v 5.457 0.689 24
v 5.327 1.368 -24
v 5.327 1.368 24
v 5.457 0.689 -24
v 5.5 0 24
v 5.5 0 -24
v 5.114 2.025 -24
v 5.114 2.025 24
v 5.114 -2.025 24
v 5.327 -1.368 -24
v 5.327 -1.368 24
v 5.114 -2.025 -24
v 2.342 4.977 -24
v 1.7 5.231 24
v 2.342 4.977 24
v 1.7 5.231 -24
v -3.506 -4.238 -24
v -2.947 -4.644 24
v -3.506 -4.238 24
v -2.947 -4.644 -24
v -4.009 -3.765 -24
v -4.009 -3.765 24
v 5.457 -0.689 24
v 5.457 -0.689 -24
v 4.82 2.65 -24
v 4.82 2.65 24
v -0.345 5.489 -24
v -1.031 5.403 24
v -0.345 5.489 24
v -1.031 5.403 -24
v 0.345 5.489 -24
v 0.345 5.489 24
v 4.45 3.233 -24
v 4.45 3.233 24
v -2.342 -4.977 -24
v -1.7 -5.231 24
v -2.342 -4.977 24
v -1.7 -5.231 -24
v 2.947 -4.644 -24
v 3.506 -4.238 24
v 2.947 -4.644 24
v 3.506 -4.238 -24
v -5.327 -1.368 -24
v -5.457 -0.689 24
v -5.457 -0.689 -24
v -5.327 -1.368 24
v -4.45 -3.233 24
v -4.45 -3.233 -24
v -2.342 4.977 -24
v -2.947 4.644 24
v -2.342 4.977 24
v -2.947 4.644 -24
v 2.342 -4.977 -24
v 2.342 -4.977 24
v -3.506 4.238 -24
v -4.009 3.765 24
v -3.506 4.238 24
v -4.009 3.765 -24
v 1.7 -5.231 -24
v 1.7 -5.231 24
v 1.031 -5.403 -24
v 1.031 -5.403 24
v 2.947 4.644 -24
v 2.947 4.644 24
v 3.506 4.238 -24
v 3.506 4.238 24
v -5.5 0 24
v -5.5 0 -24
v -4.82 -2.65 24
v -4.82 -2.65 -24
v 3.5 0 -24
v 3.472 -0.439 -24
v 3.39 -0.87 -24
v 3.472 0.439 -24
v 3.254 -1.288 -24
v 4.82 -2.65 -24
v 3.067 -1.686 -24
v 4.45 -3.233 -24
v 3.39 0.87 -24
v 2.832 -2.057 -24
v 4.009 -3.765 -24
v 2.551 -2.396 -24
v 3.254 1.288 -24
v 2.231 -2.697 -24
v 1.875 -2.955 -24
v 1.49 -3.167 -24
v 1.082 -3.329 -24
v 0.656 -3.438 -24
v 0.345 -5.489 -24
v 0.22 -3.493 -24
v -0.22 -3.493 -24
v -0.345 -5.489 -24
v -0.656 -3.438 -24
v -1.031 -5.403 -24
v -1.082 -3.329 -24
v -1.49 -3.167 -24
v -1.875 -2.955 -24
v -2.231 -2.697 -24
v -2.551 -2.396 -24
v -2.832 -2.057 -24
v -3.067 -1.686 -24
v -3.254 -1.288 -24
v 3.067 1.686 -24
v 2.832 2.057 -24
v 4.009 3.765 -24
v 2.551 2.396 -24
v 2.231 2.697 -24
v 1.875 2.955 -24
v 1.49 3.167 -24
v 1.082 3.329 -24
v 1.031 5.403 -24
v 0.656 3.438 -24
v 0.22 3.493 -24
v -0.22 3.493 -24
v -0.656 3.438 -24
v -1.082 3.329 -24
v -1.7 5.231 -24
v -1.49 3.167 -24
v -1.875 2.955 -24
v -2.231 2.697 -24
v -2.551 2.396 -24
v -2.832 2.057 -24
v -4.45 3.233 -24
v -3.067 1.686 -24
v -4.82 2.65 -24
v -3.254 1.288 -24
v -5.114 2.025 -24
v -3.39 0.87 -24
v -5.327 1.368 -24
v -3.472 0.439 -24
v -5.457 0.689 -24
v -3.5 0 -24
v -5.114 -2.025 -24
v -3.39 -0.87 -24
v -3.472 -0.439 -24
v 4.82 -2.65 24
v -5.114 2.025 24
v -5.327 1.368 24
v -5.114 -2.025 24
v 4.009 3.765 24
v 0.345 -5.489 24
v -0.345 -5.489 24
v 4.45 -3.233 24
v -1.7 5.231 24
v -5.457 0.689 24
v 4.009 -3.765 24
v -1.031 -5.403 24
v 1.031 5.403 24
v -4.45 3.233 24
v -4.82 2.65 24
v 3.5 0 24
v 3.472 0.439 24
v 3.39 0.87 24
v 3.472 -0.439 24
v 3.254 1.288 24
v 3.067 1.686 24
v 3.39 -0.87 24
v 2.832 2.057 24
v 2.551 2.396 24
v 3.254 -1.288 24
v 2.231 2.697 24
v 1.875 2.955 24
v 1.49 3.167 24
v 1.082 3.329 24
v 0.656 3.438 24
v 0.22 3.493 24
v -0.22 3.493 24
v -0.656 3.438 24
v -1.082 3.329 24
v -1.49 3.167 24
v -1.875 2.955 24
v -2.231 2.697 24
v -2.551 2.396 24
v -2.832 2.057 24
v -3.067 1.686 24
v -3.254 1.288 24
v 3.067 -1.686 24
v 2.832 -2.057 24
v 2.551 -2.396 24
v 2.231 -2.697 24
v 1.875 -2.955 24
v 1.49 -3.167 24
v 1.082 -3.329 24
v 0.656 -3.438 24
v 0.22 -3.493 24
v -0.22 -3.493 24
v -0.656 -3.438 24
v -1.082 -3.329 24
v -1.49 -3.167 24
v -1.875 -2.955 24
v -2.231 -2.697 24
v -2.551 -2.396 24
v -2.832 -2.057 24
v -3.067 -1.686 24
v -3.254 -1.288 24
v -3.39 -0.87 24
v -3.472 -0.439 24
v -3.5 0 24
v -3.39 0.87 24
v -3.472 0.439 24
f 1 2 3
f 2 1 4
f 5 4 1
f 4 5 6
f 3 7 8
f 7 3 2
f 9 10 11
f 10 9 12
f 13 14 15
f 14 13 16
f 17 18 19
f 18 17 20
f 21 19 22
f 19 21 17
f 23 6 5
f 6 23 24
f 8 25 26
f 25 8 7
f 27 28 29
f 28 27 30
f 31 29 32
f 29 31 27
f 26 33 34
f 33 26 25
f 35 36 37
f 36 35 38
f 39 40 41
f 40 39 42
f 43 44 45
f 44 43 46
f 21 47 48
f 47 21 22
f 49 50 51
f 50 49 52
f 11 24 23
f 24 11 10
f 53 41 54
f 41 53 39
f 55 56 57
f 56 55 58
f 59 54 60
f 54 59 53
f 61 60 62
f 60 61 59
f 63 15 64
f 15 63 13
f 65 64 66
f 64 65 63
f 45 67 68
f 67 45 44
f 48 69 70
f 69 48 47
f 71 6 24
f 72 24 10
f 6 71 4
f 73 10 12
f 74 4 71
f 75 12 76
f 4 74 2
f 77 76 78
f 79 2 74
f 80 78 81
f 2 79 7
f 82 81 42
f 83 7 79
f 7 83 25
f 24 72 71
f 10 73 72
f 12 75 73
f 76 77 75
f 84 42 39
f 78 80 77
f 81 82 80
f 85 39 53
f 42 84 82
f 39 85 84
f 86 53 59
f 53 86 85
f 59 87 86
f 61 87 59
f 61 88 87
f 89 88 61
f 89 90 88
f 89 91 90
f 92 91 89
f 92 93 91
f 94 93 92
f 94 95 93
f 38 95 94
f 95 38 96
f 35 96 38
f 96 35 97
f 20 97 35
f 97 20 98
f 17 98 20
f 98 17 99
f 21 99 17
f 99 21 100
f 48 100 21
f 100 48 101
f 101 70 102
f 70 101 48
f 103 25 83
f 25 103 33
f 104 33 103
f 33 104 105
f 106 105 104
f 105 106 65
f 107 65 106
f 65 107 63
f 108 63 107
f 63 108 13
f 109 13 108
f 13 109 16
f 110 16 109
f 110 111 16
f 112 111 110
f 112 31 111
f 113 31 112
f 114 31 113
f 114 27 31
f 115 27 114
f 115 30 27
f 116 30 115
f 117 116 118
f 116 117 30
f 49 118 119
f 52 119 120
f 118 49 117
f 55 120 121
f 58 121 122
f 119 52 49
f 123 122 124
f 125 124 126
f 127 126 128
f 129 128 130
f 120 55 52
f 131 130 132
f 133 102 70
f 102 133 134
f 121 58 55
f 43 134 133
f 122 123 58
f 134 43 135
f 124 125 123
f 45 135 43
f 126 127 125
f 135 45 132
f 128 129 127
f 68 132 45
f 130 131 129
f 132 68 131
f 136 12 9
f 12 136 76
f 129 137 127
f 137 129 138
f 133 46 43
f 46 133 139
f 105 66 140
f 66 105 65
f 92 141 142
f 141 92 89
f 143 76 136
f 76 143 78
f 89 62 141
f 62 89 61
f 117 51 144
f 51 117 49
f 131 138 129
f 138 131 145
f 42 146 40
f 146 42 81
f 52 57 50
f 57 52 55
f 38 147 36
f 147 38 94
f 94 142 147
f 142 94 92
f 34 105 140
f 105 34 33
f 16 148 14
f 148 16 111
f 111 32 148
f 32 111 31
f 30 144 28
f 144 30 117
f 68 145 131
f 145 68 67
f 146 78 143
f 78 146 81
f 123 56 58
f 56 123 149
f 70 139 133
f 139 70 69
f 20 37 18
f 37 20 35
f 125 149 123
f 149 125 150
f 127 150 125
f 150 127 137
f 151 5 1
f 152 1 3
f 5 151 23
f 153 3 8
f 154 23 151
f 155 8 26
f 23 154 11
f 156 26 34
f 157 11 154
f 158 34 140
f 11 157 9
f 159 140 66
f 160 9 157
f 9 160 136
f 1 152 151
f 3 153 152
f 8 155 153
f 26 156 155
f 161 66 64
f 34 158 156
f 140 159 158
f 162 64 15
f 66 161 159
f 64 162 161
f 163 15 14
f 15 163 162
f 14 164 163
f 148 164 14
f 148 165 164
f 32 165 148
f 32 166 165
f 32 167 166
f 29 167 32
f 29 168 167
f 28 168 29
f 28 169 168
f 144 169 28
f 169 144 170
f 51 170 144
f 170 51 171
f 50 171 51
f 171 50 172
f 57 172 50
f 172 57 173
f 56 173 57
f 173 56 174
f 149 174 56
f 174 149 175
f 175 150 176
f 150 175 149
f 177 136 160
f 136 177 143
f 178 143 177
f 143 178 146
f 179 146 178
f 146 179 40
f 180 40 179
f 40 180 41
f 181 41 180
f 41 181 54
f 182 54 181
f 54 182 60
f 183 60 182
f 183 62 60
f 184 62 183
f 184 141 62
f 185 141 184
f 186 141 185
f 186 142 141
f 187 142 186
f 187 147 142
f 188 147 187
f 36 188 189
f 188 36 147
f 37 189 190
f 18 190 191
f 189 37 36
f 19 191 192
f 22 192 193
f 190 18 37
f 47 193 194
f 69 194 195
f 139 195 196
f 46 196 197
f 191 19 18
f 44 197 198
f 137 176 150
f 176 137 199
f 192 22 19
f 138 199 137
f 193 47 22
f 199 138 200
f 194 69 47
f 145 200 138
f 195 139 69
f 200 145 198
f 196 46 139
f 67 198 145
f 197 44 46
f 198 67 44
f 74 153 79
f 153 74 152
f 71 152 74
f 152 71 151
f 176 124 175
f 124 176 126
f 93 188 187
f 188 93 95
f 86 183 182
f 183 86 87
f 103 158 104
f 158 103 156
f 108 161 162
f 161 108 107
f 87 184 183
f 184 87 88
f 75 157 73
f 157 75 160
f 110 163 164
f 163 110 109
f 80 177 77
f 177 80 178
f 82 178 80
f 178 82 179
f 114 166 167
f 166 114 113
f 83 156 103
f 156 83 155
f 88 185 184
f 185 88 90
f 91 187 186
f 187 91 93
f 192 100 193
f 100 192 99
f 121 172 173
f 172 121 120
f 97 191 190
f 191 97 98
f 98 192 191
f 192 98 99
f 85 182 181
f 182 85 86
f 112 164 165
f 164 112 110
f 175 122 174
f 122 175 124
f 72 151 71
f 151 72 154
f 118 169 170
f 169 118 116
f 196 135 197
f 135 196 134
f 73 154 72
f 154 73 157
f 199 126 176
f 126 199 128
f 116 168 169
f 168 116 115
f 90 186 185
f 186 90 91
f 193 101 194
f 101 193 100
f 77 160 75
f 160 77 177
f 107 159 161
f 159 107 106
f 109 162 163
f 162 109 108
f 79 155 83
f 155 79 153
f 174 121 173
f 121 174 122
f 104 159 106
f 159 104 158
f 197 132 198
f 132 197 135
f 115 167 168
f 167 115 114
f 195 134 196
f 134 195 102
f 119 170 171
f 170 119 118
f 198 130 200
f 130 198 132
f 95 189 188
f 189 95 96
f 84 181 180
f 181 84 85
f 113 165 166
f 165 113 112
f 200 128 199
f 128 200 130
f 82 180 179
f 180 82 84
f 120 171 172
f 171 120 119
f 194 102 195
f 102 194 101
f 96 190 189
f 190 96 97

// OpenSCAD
$fn = 50;


difference() {
	union() {
		translate(v = [0, 0, -24.0000000000]) {
			cylinder(h = 48, r = 5.5000000000);
		}
	}
	union() {
		translate(v = [0, 0, -100.0000000000]) {
			cylinder(h = 200, r = 3.5000000000);
		}
	}
}
